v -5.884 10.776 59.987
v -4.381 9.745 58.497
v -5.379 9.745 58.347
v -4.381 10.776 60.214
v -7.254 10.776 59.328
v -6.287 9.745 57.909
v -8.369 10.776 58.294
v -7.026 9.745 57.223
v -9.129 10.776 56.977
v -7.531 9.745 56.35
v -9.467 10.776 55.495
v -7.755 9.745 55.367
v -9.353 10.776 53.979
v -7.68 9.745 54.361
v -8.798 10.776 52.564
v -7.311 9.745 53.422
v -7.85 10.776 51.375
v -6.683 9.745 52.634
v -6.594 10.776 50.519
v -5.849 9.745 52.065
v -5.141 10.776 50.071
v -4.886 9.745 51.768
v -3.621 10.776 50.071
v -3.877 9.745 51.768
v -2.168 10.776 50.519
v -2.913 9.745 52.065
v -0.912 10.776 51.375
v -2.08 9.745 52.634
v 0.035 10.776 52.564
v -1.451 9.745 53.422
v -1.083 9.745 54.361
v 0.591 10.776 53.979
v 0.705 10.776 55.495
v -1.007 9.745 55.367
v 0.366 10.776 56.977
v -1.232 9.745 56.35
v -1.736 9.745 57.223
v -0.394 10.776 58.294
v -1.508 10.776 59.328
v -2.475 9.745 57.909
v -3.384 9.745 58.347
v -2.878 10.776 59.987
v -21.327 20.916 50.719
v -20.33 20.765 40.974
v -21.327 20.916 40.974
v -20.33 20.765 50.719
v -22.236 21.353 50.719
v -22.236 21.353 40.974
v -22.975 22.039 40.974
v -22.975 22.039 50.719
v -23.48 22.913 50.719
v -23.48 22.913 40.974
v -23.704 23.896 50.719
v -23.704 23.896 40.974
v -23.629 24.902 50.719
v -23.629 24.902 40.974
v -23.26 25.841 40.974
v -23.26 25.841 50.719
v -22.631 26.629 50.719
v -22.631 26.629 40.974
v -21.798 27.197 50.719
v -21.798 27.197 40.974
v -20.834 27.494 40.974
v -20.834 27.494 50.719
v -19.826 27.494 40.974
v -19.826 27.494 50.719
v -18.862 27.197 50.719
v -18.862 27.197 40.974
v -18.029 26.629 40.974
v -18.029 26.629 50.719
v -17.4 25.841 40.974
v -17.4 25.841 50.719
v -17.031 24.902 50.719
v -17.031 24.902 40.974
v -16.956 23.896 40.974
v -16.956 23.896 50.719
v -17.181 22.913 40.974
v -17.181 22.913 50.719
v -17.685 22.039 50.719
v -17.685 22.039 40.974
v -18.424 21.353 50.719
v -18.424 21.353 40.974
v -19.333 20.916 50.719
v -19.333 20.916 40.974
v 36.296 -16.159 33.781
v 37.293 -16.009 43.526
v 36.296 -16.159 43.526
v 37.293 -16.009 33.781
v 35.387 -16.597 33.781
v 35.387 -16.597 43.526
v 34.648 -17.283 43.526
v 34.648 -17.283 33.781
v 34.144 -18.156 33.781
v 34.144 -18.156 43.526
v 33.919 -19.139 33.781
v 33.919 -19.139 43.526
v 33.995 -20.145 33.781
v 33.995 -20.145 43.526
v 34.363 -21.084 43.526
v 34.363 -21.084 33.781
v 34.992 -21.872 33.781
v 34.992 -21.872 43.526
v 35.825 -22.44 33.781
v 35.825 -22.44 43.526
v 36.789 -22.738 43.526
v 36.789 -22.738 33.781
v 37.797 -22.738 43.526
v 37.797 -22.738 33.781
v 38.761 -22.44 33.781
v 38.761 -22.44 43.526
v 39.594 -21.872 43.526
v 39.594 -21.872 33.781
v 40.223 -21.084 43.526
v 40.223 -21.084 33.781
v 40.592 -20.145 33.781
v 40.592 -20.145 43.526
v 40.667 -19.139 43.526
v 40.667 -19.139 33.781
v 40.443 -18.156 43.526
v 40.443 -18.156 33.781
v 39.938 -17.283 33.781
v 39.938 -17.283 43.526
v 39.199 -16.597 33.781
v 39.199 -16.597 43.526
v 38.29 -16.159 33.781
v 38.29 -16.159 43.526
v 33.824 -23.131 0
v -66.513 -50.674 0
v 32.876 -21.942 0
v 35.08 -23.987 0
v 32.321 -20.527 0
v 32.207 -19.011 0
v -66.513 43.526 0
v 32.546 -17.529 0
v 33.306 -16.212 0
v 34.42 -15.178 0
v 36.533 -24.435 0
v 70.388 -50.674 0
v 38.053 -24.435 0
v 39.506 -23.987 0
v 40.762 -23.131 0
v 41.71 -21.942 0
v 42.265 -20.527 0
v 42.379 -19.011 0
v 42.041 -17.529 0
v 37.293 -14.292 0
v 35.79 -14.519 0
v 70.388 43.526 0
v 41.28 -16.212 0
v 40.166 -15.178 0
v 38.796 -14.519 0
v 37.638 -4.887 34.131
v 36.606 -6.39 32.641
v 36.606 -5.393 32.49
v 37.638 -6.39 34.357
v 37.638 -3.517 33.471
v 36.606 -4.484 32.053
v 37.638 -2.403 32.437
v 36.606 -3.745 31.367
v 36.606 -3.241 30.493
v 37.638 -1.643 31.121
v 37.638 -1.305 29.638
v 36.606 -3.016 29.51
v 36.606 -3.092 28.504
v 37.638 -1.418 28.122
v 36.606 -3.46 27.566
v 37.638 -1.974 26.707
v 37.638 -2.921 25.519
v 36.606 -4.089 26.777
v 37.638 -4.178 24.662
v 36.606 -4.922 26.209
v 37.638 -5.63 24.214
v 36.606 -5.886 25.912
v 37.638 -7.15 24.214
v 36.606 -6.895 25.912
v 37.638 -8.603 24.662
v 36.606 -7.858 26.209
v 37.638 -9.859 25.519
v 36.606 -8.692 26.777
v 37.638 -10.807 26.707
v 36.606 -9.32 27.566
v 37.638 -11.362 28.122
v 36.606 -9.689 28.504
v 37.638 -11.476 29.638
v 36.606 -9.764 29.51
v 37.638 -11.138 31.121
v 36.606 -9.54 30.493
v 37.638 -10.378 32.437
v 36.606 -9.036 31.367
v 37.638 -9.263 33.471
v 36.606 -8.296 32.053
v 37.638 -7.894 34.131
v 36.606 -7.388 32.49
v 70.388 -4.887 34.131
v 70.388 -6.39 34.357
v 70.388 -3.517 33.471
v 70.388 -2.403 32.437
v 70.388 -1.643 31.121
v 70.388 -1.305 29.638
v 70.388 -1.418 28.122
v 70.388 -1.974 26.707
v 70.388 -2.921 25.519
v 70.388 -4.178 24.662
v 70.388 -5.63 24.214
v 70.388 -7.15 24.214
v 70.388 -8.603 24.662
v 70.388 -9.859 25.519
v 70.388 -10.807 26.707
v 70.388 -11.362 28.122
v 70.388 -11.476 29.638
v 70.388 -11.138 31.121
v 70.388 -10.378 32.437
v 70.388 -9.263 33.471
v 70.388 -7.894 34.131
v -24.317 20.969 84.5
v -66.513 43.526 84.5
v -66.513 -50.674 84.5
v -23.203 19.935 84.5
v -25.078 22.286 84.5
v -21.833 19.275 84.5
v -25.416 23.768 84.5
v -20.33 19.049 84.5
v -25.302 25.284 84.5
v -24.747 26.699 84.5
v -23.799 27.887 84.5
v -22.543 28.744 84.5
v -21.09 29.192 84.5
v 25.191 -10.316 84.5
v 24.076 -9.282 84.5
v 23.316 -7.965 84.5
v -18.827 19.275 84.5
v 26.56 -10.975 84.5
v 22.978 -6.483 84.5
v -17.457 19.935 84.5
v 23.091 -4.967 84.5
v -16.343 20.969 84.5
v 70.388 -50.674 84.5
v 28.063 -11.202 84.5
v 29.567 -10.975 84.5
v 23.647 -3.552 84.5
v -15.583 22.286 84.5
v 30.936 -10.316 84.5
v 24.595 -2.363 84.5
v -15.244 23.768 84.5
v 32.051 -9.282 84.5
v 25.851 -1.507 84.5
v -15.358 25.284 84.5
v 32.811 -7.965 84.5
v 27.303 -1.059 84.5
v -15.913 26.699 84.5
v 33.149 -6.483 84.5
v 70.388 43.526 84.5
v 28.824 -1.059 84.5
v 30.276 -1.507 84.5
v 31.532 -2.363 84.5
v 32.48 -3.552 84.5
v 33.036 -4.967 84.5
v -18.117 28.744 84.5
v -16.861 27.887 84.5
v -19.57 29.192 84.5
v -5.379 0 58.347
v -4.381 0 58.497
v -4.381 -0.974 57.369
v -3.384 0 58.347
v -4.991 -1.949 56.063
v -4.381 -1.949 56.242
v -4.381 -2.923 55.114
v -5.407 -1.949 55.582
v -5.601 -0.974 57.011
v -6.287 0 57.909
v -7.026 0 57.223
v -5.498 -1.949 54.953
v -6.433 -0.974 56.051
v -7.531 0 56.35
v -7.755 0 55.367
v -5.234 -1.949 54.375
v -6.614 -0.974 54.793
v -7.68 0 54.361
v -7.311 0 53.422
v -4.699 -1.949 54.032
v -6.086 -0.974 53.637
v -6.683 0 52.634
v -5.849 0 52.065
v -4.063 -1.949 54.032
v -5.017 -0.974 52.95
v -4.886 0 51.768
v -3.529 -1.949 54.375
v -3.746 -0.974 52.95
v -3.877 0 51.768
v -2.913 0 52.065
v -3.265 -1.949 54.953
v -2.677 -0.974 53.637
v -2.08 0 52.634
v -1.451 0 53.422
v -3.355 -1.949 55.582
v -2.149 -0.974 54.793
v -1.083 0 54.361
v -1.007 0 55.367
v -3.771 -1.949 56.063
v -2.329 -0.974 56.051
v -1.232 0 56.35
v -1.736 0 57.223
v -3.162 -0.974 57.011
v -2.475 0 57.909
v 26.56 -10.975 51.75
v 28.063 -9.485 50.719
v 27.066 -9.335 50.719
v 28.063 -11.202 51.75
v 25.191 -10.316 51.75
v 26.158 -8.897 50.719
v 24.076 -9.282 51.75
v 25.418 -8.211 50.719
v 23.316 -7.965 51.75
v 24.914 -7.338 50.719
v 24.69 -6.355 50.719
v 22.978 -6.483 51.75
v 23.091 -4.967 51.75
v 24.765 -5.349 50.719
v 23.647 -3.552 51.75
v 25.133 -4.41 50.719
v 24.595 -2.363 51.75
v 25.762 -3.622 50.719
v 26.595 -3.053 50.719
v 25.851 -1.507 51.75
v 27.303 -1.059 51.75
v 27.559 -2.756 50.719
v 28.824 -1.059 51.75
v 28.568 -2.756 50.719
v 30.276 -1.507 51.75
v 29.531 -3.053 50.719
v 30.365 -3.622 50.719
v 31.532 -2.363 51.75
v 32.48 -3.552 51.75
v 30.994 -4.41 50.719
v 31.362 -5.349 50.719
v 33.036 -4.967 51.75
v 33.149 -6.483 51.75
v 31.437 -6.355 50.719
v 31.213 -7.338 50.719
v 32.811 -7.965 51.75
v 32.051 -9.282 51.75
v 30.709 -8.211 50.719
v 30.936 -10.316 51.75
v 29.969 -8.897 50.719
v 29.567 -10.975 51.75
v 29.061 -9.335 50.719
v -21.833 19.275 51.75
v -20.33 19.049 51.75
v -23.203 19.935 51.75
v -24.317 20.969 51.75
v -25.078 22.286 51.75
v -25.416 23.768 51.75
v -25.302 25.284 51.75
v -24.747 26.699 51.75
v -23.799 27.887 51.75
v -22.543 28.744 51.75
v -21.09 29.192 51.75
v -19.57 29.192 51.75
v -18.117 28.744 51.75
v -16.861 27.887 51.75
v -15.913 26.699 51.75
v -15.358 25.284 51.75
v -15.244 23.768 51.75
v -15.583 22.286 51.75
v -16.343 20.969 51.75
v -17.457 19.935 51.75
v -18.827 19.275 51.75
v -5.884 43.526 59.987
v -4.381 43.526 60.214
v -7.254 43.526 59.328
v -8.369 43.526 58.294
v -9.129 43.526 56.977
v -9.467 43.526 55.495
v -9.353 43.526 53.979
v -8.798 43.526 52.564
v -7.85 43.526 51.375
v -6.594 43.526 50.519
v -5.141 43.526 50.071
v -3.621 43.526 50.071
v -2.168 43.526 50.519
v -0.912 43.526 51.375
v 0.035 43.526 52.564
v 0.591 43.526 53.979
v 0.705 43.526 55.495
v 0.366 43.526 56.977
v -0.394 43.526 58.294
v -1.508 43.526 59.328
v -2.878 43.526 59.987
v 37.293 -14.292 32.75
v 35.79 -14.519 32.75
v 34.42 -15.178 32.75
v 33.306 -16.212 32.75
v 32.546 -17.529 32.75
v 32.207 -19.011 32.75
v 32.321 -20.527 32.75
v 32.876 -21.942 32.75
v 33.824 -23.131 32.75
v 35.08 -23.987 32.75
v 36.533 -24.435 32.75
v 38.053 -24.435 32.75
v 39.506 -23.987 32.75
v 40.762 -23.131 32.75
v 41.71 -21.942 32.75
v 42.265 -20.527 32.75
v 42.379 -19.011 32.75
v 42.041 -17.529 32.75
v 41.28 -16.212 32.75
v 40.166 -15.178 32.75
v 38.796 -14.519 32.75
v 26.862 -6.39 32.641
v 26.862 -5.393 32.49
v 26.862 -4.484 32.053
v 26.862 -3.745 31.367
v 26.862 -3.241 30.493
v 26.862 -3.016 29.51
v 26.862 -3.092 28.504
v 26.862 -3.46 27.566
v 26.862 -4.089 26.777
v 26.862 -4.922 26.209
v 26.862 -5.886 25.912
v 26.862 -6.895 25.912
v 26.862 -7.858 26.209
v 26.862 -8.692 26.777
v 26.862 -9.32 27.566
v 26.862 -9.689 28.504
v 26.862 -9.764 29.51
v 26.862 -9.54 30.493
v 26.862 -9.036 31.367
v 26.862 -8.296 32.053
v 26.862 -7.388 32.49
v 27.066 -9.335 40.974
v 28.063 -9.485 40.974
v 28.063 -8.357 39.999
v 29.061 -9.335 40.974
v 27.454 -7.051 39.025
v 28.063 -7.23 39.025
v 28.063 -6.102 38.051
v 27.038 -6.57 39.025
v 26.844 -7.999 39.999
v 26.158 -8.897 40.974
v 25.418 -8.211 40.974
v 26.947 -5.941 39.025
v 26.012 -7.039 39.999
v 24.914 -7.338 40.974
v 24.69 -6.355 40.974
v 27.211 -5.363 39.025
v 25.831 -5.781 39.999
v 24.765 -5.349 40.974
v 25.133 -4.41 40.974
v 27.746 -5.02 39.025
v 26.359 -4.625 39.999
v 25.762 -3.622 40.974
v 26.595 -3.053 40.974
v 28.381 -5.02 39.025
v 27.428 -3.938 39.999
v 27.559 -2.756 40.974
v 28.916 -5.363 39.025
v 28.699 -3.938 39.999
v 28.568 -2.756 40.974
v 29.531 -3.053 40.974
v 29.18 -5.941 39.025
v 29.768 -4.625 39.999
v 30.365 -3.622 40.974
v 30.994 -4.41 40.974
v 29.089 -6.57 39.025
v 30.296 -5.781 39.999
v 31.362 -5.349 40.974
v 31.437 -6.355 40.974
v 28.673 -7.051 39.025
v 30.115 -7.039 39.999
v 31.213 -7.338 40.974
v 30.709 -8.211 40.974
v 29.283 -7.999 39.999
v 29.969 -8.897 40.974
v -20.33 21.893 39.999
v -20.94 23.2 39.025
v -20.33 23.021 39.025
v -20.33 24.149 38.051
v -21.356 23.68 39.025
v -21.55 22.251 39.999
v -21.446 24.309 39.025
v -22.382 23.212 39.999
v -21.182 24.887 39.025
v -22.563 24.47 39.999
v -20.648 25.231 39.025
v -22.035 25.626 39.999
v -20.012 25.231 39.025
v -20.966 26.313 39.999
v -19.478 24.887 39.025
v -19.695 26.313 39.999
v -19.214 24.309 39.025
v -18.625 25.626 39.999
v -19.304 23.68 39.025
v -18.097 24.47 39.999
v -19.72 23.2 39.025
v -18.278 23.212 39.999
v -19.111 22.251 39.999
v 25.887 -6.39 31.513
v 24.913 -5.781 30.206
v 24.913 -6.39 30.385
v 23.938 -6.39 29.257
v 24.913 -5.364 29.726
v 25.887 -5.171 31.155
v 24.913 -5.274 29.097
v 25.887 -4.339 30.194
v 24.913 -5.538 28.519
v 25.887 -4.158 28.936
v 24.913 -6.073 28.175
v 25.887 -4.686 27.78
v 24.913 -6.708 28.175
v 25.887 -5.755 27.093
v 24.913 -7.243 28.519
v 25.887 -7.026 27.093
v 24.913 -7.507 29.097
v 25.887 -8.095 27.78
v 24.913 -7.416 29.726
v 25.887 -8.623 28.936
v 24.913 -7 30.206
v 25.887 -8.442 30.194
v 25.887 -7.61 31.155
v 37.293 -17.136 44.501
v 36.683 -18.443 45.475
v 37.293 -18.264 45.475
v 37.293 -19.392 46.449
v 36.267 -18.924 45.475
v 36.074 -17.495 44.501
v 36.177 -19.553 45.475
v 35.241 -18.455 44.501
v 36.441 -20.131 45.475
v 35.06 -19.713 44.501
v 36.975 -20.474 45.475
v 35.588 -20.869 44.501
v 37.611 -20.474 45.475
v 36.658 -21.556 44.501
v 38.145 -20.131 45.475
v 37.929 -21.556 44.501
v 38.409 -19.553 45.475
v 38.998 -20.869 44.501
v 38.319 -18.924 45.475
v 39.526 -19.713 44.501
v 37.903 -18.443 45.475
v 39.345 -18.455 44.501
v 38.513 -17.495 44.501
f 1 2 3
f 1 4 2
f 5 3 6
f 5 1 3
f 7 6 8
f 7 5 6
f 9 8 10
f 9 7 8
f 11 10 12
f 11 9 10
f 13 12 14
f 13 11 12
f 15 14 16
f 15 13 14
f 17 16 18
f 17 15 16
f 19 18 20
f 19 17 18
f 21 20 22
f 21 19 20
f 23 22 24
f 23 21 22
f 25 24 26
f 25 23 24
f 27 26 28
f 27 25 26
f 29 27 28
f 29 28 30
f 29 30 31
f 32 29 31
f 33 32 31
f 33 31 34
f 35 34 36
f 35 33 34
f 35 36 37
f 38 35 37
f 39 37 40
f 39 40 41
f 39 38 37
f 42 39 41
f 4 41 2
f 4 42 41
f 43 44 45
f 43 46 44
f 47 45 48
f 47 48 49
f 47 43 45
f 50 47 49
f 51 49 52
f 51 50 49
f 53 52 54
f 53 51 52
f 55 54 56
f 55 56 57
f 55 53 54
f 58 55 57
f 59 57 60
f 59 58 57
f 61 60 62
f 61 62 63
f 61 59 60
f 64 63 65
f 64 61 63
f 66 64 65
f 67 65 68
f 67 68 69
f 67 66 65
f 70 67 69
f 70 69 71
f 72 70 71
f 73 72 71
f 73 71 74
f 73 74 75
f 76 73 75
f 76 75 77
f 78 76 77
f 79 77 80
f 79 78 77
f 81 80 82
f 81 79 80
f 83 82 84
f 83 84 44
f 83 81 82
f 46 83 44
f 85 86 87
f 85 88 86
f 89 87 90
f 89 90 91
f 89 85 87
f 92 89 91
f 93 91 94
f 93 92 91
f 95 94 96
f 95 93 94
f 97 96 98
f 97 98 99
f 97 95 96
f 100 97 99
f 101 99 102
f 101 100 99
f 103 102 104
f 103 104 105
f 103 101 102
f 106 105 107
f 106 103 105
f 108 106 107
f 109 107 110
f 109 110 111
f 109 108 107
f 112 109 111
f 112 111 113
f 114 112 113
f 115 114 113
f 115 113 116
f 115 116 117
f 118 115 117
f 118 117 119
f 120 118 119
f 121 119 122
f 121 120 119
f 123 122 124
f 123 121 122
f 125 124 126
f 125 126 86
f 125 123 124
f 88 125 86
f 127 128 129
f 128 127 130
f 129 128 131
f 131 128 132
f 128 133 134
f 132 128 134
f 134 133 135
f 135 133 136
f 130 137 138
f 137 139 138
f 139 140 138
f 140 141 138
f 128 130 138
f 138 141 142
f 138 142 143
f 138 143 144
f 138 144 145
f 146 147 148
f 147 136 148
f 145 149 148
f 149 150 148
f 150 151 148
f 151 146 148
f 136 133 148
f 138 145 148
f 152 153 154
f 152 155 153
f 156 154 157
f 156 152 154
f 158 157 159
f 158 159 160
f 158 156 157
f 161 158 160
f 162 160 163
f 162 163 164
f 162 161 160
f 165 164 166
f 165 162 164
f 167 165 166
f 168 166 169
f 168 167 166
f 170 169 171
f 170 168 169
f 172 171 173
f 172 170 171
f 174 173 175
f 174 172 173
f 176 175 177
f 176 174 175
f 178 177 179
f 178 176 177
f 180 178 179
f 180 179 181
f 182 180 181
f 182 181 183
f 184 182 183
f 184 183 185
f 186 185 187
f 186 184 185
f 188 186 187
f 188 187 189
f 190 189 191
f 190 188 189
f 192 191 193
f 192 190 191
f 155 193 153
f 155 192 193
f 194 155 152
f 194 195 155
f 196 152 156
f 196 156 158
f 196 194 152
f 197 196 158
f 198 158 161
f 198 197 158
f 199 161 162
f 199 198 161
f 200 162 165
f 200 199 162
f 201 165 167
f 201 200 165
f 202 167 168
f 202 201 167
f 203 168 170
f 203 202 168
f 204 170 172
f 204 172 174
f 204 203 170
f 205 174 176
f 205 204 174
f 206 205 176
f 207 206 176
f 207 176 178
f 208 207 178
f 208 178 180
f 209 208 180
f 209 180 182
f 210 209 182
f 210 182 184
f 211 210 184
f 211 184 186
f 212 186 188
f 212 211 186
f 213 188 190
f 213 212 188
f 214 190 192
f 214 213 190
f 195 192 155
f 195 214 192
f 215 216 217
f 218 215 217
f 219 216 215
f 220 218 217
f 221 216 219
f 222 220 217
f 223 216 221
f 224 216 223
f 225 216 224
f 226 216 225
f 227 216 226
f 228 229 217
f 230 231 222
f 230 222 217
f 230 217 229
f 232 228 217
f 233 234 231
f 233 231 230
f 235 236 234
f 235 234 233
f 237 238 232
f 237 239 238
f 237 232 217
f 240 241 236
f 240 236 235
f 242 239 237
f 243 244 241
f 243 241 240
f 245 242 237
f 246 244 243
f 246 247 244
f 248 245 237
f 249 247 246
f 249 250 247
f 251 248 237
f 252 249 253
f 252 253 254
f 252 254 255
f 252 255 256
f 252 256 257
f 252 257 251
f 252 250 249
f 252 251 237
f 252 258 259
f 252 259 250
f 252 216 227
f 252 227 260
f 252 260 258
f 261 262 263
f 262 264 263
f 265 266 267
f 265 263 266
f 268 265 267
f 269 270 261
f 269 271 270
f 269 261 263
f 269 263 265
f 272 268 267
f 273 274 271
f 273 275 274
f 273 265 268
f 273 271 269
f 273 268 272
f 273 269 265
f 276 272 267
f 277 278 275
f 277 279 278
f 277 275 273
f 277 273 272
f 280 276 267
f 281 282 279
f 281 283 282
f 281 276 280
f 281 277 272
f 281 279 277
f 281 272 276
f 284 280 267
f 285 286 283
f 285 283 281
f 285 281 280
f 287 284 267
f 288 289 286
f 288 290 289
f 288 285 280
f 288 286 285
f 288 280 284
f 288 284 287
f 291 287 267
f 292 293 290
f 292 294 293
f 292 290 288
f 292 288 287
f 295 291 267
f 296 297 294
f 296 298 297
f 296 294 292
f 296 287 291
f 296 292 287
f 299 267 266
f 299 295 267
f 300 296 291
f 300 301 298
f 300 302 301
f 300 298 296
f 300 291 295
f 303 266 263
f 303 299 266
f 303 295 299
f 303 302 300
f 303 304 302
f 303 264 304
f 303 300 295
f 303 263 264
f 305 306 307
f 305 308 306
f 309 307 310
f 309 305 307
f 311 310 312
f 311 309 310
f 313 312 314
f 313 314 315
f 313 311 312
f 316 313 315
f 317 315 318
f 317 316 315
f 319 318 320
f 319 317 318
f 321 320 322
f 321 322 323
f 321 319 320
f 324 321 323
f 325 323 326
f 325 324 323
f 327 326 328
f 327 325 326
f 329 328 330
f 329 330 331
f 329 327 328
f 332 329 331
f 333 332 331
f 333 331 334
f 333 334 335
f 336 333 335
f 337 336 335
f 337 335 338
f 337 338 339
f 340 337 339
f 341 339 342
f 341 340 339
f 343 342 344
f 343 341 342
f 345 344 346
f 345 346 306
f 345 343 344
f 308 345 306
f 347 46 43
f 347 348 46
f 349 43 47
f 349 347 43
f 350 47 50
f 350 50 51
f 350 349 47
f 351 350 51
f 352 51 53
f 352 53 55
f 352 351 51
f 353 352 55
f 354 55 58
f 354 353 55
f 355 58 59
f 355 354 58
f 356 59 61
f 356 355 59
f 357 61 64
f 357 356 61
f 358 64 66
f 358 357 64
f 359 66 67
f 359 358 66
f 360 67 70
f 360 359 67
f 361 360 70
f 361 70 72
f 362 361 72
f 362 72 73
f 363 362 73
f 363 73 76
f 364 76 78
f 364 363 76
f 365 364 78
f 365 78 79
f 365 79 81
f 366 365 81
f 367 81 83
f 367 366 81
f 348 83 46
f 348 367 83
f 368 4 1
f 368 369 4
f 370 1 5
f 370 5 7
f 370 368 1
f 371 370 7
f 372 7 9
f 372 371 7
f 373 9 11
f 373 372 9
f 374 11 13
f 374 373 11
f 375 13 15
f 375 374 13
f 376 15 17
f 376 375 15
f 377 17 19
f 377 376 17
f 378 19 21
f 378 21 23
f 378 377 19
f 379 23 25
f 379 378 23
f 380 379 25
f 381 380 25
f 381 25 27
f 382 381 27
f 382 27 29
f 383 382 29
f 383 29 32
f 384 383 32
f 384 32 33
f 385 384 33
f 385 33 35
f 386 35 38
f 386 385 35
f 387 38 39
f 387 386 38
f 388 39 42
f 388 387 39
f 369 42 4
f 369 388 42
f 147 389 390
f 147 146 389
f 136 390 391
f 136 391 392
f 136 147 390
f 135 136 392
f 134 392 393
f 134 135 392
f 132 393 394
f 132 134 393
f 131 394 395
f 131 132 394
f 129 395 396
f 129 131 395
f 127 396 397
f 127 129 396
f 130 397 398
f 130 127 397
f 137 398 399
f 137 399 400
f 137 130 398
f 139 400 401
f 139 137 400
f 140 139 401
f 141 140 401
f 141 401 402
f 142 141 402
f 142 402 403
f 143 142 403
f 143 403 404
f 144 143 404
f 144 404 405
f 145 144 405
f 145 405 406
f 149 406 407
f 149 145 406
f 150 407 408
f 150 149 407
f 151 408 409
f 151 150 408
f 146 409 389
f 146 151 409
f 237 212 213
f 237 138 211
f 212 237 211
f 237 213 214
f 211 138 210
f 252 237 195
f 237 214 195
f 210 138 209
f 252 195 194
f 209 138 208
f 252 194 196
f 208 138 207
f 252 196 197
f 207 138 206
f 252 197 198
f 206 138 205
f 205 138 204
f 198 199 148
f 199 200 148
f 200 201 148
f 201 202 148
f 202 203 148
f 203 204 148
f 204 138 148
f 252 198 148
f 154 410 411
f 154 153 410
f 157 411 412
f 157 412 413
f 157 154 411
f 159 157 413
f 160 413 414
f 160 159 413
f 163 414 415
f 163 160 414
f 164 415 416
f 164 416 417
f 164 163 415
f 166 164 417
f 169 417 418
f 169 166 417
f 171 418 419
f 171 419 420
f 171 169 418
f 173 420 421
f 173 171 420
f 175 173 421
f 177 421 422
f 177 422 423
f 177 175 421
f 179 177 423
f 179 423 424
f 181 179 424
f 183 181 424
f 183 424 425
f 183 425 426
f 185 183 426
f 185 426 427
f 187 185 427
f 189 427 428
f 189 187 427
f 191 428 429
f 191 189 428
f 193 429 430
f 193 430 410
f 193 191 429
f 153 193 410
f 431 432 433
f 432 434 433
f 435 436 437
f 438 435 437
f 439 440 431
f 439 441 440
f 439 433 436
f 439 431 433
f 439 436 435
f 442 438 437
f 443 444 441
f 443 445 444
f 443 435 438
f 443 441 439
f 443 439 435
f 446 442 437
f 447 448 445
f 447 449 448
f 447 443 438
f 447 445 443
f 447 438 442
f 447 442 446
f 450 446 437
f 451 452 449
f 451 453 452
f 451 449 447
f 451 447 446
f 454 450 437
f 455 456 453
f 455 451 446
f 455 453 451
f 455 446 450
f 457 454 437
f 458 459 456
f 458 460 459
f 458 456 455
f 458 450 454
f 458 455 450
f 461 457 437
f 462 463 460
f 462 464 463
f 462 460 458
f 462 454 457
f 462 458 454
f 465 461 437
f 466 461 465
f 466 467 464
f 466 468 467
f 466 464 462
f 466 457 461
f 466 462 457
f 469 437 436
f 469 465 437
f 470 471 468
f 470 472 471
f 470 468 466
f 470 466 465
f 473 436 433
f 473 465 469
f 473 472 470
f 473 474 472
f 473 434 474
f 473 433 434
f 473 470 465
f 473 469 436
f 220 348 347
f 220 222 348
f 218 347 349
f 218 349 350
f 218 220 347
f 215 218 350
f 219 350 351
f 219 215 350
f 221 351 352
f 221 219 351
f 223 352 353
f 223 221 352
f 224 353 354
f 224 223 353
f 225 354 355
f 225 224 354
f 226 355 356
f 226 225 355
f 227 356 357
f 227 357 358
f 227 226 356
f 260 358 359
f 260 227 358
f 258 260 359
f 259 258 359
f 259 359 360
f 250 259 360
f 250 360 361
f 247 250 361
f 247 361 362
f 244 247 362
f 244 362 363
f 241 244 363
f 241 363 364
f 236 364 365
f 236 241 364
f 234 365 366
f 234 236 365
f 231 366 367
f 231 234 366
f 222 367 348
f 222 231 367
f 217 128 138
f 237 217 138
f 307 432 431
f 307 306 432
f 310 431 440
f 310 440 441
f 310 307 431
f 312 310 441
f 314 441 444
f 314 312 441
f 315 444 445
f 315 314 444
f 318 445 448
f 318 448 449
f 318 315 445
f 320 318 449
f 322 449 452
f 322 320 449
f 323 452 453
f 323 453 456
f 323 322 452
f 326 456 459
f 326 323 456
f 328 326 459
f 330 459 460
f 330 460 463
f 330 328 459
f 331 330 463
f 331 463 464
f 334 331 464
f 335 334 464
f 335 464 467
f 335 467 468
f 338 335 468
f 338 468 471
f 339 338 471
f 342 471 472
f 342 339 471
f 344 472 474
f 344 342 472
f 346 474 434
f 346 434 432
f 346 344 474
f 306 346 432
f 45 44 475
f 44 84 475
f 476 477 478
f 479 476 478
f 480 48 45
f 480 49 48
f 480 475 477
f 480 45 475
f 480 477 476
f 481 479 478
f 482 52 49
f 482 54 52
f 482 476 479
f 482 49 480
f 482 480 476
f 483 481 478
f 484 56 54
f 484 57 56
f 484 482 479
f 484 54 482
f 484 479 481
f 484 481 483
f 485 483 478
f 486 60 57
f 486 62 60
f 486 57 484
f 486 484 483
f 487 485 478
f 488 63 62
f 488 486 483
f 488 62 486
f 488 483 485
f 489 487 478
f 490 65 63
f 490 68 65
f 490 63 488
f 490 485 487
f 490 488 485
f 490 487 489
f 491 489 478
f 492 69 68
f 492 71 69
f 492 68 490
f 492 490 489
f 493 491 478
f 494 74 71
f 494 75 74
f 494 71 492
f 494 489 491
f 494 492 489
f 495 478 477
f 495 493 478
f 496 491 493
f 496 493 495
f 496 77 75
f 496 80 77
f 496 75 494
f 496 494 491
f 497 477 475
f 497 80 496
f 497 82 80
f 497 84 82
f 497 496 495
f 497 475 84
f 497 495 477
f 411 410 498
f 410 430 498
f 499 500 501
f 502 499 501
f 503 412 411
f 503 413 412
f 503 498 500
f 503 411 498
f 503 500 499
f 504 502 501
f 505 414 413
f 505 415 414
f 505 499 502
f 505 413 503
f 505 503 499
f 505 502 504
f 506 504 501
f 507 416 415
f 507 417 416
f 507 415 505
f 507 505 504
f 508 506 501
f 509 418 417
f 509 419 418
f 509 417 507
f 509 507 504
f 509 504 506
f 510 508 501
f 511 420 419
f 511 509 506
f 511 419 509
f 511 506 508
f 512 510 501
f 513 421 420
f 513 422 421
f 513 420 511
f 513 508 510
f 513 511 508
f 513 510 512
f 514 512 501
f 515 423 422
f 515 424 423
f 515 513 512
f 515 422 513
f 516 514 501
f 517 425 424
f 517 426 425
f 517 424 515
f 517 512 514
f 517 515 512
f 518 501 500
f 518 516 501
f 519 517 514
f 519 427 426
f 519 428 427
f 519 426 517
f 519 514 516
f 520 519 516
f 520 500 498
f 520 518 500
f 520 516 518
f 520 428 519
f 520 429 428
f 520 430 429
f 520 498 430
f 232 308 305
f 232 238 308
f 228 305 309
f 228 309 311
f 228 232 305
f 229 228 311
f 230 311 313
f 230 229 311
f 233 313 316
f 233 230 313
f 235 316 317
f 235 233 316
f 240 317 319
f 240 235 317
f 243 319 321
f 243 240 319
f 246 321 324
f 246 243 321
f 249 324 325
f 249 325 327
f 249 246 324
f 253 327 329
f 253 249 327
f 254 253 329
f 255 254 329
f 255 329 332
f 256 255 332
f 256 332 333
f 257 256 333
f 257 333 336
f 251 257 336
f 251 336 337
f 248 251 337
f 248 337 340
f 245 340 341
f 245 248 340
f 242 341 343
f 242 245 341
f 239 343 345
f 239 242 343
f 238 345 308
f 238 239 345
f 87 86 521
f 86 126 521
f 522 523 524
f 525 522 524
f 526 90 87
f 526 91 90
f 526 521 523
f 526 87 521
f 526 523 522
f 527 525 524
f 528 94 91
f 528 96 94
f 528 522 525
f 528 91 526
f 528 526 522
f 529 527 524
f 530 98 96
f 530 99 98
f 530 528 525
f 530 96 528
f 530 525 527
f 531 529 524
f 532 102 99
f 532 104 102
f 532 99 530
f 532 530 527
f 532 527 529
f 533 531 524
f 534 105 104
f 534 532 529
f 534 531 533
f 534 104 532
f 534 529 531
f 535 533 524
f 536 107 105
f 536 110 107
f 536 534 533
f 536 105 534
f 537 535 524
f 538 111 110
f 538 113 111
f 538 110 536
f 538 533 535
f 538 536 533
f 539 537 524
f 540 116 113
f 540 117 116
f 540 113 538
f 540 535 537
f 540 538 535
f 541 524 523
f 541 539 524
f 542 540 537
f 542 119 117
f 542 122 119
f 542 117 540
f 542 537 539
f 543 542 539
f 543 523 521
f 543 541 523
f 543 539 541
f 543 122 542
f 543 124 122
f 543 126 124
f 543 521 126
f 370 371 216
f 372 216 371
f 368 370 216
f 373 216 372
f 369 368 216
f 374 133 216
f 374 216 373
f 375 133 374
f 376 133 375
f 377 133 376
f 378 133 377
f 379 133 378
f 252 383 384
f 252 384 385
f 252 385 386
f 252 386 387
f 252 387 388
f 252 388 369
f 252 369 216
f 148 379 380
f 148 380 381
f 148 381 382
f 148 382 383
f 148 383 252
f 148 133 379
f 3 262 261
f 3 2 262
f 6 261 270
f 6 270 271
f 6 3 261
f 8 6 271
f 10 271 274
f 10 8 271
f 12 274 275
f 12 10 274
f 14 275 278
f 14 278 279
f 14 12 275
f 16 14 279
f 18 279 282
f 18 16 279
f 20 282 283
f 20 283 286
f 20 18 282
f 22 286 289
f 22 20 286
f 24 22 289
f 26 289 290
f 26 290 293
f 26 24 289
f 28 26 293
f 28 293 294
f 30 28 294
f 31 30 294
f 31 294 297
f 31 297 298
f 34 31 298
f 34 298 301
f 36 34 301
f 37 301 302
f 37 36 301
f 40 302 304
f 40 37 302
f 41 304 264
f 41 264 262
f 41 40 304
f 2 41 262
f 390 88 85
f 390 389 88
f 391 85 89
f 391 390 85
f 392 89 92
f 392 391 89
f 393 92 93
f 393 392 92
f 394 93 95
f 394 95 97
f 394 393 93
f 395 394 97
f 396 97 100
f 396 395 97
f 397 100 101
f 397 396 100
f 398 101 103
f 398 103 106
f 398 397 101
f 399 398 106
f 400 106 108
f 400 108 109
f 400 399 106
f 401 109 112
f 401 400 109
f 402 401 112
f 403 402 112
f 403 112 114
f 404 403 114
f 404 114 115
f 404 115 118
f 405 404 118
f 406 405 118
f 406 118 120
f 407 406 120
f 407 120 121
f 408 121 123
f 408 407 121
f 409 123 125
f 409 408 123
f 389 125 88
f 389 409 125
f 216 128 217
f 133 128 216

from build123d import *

# Parameters (mm, degrees)
SKETCH1_W      = 136.900969975
SKETCH1_H      = 94.199596476
EXTRUDE1_DEPTH = 84.5


with BuildPart() as part:
    # Sketch1 → Extrude1 (new body)
    with BuildSketch(Plane.XY):
        with Locations((1.93720992, -3.5737201)):
            Rectangle(SKETCH1_W, SKETCH1_H)
    extrude(amount=EXTRUDE1_DEPTH)

    # Sketch2 → M12 Tapped Hole1 (revolve, cut)
    with BuildSketch(Plane(origin=(-4.381234194, 43.526078138, 55.113795081), x_dir=(0, 0, 1), z_dir=(1, 0, 0))):
        Polygon((0, 0), (0, 35.814389157), (0, 46.449423676), (3.383397233, 43.526078138), (3.383397233, 33.781439001), (5.1, 32.75), (5.1, 0), align=None)
    revolve(axis=Axis((-4.381234194, 49.876078138, 55.113795081), (0, -1, 0)), mode=Mode.SUBTRACT)

    # Sketch2 at point 2 (carried to point 2, square into its face) → M12 Tapped Hole1 at 2 (revolve, cut)
    with BuildSketch(Plane(origin=(-20.330054758, 24.148847321, 84.5), x_dir=(0, -1, 0), z_dir=(1, 0, 0))):
        Polygon((0, 0), (0, 35.814389157), (0, 46.449423676), (3.383397233, 43.526078138), (3.383397233, 33.781439001), (5.1, 32.75), (5.1, 0), align=None)
    revolve(axis=Axis((-20.330054758, 24.148847321, 90.85), (0, 0, -1)), mode=Mode.SUBTRACT)

    # Sketch2 at point 3 (carried to point 3, square into its face) → M12 Tapped Hole1 at 3 (revolve, cut)
    with BuildSketch(Plane(origin=(28.063494867, -6.101798408, 84.5), x_dir=(0, -1, 0), z_dir=(1, 0, 0))):
        Polygon((0, 0), (0, 35.814389157), (0, 46.449423676), (3.383397233, 43.526078138), (3.383397233, 33.781439001), (5.1, 32.75), (5.1, 0), align=None)
    revolve(axis=Axis((28.063494867, -6.101798408, 90.85), (0, 0, -1)), mode=Mode.SUBTRACT)

    # Sketch2 at point 4 (carried to point 4, square into its face) → M12 Tapped Hole1 at 4 (revolve, cut)
    with BuildSketch(Plane(origin=(70.387694908, -6.390360142, 29.257323255), x_dir=(0, 0, 1), z_dir=(0, -1, 0))):
        Polygon((0, 0), (0, 35.814389157), (0, 46.449423676), (3.383397233, 43.526078138), (3.383397233, 33.781439001), (5.1, 32.75), (5.1, 0), align=None)
    revolve(axis=Axis((76.737694908, -6.390360142, 29.257323255), (-1, 0, 0)), mode=Mode.SUBTRACT)

    # Sketch2 at point 5 (carried to point 5, square into its face) → M12 Tapped Hole1 at 5 (revolve, cut)
    with BuildSketch(Plane(origin=(37.293087605, -19.39205915, 0), x_dir=(0, 1, 0), z_dir=(1, 0, 0))):
        Polygon((0, 0), (0, 35.814389157), (0, 46.449423676), (3.383397233, 43.526078138), (3.383397233, 33.781439001), (5.1, 32.75), (5.1, 0), align=None)
    revolve(axis=Axis((37.293087605, -19.39205915, -6.35), (0, 0, 1)), mode=Mode.SUBTRACT)


solid = part.part
